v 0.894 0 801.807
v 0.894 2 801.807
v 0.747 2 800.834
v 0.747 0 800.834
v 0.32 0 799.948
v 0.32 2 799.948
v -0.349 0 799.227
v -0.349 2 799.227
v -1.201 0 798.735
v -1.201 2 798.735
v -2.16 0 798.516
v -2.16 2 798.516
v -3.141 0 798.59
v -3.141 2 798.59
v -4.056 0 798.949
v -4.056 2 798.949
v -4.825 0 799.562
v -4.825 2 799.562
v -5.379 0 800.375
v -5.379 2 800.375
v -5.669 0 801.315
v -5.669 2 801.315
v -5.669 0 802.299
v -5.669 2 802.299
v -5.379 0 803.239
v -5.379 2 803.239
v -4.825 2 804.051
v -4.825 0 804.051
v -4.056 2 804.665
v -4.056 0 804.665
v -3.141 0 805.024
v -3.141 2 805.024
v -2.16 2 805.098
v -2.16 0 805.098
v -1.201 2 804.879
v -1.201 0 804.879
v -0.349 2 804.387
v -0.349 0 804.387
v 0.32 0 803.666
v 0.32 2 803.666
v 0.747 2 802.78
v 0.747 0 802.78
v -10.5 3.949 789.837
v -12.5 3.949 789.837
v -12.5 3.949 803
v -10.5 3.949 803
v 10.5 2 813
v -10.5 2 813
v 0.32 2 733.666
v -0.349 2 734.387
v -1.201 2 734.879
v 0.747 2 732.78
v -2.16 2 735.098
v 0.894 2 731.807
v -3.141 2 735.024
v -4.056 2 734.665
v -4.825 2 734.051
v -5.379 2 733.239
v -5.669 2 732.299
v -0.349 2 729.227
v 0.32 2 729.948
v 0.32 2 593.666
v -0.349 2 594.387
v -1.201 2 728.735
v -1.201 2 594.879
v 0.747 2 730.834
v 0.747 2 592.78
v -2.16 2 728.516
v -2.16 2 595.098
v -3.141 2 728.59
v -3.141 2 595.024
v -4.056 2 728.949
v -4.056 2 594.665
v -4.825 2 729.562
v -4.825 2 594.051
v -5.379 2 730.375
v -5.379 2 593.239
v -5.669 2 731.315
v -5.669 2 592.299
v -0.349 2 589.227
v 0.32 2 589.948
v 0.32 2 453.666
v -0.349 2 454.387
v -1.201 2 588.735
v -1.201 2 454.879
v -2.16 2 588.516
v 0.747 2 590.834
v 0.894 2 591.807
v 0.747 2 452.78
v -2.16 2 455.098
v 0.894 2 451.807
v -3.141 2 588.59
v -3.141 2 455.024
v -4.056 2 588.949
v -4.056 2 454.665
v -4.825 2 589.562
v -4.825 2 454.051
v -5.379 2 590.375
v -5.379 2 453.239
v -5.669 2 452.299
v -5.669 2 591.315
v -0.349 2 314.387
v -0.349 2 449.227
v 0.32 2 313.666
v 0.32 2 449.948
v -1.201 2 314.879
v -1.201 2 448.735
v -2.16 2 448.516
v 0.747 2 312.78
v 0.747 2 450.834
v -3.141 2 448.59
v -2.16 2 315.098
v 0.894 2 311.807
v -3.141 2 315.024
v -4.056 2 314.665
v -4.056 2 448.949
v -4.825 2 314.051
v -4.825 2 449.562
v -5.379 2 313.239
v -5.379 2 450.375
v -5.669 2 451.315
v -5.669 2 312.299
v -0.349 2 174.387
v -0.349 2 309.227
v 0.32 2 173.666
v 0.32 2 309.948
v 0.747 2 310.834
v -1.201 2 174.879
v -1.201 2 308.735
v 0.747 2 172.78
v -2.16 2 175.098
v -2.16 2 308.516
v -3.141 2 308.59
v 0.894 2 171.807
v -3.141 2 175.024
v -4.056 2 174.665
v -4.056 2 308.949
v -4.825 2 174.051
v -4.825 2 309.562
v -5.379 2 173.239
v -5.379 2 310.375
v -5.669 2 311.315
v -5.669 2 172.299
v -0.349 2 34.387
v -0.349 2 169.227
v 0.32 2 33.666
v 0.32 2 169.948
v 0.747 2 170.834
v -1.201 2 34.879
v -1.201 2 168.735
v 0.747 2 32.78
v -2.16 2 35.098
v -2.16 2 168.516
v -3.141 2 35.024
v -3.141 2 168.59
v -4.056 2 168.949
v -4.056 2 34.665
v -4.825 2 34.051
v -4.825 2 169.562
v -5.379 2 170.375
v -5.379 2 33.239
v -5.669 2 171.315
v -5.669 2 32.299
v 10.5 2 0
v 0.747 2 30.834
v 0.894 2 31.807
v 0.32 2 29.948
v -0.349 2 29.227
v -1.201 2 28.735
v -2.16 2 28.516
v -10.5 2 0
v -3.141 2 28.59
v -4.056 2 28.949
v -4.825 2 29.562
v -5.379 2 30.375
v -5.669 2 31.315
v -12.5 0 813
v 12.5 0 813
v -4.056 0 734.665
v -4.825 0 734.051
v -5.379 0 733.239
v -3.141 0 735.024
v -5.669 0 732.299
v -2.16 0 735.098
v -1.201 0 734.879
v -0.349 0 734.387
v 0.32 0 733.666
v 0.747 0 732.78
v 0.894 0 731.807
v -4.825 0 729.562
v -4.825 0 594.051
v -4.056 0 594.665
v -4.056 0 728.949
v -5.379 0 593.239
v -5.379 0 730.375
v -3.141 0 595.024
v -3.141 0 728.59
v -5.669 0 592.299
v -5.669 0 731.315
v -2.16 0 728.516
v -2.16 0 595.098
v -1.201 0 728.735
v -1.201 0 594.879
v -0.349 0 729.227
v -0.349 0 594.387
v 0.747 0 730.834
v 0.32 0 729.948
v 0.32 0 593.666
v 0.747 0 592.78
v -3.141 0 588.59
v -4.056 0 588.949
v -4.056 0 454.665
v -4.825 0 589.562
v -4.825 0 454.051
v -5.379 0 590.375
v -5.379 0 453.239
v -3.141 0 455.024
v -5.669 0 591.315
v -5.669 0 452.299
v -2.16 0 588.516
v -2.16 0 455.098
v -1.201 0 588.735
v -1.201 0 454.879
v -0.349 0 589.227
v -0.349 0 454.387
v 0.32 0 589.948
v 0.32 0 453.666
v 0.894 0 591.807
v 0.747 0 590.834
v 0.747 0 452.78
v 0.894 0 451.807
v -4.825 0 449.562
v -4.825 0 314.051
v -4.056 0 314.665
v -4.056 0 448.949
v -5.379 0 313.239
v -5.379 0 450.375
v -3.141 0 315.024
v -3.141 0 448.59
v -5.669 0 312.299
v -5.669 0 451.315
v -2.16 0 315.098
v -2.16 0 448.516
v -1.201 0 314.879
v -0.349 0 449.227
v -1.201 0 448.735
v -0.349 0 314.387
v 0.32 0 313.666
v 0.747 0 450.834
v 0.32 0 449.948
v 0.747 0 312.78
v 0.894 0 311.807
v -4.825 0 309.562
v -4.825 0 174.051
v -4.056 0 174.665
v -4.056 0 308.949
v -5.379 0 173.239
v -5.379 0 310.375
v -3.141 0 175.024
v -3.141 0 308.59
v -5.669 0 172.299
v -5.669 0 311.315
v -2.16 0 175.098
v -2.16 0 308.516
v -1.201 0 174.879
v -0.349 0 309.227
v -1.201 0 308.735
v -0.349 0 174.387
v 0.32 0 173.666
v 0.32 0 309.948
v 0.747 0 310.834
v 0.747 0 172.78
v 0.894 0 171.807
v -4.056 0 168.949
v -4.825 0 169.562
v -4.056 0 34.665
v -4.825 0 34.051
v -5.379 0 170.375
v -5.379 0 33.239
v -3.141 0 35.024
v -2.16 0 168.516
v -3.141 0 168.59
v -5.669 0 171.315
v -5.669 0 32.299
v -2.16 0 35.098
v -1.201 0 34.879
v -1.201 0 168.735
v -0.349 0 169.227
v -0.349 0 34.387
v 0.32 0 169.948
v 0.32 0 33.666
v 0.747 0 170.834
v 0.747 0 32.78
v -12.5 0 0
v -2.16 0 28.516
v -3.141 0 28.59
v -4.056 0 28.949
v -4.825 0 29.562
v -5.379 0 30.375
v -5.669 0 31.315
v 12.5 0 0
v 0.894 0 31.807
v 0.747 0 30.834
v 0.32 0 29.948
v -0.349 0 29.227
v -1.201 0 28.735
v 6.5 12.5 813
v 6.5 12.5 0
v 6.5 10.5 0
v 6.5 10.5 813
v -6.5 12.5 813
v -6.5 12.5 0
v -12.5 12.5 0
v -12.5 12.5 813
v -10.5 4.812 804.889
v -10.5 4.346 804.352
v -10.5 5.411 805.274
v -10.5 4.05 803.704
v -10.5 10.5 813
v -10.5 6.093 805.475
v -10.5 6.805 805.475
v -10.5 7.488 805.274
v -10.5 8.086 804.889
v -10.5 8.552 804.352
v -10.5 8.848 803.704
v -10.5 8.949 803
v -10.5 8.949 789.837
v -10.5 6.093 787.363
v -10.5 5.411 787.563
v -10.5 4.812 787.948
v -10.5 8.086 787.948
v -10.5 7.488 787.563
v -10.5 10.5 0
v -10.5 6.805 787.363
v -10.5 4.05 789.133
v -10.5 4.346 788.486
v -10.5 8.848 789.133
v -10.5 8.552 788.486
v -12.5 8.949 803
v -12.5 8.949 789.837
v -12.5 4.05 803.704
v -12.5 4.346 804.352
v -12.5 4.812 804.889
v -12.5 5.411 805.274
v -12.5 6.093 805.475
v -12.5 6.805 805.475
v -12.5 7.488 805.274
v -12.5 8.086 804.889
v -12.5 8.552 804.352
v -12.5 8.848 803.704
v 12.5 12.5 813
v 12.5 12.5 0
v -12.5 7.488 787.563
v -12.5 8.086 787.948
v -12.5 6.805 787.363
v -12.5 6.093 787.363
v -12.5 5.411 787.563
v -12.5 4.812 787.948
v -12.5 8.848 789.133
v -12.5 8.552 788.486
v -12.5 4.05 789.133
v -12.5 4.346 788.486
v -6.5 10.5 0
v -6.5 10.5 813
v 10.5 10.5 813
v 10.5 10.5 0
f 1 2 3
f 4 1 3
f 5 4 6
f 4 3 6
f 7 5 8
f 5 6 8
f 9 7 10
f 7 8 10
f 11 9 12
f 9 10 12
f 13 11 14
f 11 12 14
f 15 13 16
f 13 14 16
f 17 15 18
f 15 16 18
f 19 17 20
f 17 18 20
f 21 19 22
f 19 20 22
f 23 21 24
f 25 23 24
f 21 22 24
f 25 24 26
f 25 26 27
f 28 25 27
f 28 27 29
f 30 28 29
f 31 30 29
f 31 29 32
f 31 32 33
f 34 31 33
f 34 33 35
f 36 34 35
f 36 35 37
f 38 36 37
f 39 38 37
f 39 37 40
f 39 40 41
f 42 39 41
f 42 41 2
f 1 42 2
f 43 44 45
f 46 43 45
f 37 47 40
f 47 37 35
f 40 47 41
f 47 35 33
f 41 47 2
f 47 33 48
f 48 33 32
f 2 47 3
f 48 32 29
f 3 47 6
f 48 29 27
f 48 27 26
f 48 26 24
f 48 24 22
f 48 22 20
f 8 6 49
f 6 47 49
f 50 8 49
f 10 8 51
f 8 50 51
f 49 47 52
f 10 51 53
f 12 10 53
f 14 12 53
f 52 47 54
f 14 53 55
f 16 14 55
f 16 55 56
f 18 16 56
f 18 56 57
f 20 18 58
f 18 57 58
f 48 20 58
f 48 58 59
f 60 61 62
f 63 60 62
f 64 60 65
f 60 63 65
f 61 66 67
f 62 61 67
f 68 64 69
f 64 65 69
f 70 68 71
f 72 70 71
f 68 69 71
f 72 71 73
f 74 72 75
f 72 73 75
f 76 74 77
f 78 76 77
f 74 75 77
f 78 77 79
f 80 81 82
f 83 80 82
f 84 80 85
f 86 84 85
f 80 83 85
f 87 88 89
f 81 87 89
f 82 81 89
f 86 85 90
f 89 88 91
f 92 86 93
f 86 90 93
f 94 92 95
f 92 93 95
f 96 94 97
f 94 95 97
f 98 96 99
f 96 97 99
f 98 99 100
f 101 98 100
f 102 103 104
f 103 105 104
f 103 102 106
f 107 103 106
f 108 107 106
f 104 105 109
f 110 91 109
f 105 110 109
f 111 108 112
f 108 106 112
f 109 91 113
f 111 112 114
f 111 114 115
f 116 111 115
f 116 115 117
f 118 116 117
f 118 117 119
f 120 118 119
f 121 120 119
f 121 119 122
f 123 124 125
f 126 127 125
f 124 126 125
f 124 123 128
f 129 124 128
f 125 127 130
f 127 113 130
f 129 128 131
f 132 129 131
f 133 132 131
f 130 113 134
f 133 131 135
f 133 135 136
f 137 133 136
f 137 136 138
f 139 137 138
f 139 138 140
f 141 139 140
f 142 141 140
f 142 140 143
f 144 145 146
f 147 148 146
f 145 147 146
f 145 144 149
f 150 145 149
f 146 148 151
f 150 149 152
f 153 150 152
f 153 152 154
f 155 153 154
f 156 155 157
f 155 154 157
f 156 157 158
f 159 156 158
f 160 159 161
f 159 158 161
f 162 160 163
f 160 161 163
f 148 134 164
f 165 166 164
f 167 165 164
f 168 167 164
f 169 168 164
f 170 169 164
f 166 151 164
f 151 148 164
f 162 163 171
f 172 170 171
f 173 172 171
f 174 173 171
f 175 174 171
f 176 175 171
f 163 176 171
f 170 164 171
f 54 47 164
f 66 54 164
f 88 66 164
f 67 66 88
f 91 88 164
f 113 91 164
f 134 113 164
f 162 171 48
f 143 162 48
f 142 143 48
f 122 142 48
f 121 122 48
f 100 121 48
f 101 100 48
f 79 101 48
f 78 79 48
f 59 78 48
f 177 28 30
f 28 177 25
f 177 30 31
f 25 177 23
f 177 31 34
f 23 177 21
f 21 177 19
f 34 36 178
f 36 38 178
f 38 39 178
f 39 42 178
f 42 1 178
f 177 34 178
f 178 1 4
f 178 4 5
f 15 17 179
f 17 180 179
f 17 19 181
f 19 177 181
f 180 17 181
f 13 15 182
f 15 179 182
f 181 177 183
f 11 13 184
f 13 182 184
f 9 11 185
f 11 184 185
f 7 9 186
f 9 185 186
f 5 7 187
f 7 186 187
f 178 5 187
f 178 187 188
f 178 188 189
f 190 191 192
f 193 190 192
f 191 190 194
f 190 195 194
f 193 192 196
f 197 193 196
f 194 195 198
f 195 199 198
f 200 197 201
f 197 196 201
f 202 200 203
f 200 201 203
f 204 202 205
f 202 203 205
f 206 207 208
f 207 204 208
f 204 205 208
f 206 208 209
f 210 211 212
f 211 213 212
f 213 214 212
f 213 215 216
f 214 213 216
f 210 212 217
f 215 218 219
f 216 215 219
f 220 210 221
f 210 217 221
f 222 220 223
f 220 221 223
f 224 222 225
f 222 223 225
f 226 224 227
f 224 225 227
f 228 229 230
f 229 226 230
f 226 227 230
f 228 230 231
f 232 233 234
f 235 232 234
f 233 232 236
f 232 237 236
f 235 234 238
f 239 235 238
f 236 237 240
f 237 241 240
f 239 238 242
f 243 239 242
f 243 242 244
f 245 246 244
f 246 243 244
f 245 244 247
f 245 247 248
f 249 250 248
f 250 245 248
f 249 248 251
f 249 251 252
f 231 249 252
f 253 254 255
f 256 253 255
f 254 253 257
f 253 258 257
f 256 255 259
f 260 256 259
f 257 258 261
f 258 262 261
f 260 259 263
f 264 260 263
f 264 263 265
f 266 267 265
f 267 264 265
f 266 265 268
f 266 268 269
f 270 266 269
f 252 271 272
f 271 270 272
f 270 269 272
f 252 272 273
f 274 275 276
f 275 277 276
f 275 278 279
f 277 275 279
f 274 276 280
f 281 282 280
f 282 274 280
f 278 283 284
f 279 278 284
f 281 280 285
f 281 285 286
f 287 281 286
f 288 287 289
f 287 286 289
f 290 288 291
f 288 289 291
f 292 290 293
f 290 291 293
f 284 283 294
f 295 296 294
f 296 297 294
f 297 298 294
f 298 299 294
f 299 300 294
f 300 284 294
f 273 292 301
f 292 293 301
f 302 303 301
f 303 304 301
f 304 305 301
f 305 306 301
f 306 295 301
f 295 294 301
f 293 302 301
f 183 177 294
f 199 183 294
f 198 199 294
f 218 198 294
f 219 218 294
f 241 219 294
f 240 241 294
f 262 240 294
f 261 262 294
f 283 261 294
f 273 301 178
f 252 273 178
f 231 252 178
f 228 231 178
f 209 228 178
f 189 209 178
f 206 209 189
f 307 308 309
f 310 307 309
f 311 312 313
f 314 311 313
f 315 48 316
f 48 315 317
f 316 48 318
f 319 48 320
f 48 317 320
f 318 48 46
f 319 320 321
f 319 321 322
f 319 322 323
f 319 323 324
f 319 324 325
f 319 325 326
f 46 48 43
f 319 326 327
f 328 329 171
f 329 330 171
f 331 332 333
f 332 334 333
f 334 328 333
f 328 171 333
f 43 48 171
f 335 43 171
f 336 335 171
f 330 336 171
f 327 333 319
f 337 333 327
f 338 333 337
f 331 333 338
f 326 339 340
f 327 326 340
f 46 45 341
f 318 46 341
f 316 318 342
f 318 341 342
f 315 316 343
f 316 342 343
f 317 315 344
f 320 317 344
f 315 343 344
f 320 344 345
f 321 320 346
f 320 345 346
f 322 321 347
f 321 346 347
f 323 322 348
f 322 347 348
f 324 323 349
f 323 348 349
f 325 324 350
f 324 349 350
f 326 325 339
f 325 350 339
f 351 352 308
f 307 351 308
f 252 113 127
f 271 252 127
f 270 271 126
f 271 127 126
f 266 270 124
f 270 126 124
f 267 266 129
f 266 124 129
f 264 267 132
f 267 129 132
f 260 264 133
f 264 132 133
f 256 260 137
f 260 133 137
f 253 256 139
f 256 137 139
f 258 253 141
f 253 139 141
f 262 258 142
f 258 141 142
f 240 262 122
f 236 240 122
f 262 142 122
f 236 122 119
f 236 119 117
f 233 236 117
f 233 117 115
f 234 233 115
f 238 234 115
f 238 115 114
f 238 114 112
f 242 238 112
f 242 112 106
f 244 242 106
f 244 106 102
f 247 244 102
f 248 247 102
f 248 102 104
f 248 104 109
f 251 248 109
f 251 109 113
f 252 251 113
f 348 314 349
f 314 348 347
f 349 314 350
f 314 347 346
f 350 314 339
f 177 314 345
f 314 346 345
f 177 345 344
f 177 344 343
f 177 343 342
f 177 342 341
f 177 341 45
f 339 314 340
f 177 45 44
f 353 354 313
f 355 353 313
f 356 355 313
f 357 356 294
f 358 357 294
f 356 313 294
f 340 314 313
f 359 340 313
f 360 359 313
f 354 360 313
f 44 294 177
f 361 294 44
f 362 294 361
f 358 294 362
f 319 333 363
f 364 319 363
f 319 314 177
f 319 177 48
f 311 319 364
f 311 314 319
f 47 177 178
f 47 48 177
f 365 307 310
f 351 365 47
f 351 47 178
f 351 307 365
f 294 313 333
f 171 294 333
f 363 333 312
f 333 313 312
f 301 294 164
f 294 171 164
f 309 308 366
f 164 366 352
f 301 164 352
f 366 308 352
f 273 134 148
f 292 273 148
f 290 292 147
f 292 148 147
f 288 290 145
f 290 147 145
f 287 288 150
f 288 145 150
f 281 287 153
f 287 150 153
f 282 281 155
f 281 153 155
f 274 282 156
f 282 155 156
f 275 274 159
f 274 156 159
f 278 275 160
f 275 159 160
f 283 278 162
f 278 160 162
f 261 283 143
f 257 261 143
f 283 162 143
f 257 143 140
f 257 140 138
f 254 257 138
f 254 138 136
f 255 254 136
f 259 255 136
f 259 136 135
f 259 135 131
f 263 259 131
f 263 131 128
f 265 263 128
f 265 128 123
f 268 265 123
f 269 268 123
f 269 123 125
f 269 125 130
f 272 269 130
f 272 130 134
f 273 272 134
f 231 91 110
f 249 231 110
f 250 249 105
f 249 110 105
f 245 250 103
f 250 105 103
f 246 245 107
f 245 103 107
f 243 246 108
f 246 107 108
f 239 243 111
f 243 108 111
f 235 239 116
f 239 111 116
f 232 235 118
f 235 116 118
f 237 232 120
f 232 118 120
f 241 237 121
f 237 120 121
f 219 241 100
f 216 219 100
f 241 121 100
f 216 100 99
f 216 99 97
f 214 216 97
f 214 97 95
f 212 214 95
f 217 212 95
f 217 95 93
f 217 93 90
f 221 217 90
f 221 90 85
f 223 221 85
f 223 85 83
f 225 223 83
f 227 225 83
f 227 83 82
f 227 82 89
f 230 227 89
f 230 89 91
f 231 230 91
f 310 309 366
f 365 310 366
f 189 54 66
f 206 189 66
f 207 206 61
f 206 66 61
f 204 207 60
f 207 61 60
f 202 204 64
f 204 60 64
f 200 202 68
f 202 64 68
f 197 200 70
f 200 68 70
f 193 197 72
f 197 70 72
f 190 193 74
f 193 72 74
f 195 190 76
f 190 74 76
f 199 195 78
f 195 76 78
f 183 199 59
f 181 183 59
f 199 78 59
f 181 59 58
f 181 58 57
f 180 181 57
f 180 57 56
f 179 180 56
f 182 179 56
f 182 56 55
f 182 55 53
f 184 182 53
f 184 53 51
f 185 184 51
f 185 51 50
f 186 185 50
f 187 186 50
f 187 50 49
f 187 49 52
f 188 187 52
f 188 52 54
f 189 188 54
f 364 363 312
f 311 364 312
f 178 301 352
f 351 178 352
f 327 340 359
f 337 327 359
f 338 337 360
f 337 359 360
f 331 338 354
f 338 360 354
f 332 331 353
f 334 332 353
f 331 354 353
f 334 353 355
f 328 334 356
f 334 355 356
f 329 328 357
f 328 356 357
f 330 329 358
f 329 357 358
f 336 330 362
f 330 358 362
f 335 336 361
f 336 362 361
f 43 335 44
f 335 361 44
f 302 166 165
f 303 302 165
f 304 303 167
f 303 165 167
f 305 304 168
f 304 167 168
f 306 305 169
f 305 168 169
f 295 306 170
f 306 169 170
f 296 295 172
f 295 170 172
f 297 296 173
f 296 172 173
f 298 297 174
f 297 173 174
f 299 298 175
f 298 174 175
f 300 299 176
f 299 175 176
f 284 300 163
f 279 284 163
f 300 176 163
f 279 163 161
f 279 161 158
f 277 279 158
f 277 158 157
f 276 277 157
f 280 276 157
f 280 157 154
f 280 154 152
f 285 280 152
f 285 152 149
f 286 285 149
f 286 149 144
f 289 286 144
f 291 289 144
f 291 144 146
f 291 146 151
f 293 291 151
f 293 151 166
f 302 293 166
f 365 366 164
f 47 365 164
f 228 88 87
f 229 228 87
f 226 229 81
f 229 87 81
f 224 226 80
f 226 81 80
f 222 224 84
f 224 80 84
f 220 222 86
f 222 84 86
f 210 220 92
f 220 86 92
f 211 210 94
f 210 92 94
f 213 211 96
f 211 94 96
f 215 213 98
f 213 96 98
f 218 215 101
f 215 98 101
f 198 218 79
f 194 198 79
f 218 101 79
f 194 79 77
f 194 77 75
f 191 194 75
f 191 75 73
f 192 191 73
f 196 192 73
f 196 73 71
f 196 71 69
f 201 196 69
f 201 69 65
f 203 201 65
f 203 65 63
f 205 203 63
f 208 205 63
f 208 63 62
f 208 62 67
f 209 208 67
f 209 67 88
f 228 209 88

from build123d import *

# Parameters (mm, degrees)
BOSS_EXTRU_1_DEPTH         = 813
D_GAGEMENT_M61_D           = 6.6
R_P_TITION_LIN_AIRE1_COUNT = 12
R_P_TITION_LIN_AIRE1_PITCH = 70
CUT_EXTRUDE1_DEPTH         = 5


with BuildPart() as part:
    # Esquisse1 → Boss.-Extru.1 (new body)
    with BuildSketch(Plane.XY):
        Polygon((-6.5, 12.5), (-12.5, 12.5), (-12.5, 0), (12.5, 0), (12.5, 12.5), (6.5, 12.5), (6.5, 10.5), (10.5, 10.5), (10.5, 2), (-10.5, 2), (-10.5, 10.5), (-6.5, 10.5), align=None)
    extrude(amount=BOSS_EXTRU_1_DEPTH)

    # Dégagement M61 (through all)
    with Locations(Plane(origin=(0, 0, 0), x_dir=(-1, 0, 0), z_dir=(0, -1, 0))):
        with Locations((2.40627347, -801.806864395)):
            d_gagement_m61 = Hole(D_GAGEMENT_M61_D / 2)

    # Répétition linéaire1: Dégagement M61 ×12, 5 skipped
    with Locations(*[(0, 0, -i * R_P_TITION_LIN_AIRE1_PITCH) for i in range(1, R_P_TITION_LIN_AIRE1_COUNT) if i not in (2, 4, 6, 8, 10)]):
        add(d_gagement_m61, mode=Mode.SUBTRACT)

    # Sketch1 → Cut-Extrude1 (cut)
    with BuildSketch(Plane(origin=(-12.5, 0, 0), x_dir=(0, 0, -1), z_dir=(1, 0, 0))):
        with BuildLine():
            Line((-803, 8.949119862), (-789.837109693, 8.949119862))
            ThreePointArc((-789.837109693, 8.949119862), (-787.337109693, 6.449119862), (-789.837109693, 3.949119862))
            Line((-789.837109693, 3.949119862), (-803, 3.949119862))
            ThreePointArc((-803, 3.949119862), (-805.5, 6.449119862), (-803, 8.949119862))
        make_face()
    extrude(amount=CUT_EXTRUDE1_DEPTH, mode=Mode.SUBTRACT)


solid = part.part
